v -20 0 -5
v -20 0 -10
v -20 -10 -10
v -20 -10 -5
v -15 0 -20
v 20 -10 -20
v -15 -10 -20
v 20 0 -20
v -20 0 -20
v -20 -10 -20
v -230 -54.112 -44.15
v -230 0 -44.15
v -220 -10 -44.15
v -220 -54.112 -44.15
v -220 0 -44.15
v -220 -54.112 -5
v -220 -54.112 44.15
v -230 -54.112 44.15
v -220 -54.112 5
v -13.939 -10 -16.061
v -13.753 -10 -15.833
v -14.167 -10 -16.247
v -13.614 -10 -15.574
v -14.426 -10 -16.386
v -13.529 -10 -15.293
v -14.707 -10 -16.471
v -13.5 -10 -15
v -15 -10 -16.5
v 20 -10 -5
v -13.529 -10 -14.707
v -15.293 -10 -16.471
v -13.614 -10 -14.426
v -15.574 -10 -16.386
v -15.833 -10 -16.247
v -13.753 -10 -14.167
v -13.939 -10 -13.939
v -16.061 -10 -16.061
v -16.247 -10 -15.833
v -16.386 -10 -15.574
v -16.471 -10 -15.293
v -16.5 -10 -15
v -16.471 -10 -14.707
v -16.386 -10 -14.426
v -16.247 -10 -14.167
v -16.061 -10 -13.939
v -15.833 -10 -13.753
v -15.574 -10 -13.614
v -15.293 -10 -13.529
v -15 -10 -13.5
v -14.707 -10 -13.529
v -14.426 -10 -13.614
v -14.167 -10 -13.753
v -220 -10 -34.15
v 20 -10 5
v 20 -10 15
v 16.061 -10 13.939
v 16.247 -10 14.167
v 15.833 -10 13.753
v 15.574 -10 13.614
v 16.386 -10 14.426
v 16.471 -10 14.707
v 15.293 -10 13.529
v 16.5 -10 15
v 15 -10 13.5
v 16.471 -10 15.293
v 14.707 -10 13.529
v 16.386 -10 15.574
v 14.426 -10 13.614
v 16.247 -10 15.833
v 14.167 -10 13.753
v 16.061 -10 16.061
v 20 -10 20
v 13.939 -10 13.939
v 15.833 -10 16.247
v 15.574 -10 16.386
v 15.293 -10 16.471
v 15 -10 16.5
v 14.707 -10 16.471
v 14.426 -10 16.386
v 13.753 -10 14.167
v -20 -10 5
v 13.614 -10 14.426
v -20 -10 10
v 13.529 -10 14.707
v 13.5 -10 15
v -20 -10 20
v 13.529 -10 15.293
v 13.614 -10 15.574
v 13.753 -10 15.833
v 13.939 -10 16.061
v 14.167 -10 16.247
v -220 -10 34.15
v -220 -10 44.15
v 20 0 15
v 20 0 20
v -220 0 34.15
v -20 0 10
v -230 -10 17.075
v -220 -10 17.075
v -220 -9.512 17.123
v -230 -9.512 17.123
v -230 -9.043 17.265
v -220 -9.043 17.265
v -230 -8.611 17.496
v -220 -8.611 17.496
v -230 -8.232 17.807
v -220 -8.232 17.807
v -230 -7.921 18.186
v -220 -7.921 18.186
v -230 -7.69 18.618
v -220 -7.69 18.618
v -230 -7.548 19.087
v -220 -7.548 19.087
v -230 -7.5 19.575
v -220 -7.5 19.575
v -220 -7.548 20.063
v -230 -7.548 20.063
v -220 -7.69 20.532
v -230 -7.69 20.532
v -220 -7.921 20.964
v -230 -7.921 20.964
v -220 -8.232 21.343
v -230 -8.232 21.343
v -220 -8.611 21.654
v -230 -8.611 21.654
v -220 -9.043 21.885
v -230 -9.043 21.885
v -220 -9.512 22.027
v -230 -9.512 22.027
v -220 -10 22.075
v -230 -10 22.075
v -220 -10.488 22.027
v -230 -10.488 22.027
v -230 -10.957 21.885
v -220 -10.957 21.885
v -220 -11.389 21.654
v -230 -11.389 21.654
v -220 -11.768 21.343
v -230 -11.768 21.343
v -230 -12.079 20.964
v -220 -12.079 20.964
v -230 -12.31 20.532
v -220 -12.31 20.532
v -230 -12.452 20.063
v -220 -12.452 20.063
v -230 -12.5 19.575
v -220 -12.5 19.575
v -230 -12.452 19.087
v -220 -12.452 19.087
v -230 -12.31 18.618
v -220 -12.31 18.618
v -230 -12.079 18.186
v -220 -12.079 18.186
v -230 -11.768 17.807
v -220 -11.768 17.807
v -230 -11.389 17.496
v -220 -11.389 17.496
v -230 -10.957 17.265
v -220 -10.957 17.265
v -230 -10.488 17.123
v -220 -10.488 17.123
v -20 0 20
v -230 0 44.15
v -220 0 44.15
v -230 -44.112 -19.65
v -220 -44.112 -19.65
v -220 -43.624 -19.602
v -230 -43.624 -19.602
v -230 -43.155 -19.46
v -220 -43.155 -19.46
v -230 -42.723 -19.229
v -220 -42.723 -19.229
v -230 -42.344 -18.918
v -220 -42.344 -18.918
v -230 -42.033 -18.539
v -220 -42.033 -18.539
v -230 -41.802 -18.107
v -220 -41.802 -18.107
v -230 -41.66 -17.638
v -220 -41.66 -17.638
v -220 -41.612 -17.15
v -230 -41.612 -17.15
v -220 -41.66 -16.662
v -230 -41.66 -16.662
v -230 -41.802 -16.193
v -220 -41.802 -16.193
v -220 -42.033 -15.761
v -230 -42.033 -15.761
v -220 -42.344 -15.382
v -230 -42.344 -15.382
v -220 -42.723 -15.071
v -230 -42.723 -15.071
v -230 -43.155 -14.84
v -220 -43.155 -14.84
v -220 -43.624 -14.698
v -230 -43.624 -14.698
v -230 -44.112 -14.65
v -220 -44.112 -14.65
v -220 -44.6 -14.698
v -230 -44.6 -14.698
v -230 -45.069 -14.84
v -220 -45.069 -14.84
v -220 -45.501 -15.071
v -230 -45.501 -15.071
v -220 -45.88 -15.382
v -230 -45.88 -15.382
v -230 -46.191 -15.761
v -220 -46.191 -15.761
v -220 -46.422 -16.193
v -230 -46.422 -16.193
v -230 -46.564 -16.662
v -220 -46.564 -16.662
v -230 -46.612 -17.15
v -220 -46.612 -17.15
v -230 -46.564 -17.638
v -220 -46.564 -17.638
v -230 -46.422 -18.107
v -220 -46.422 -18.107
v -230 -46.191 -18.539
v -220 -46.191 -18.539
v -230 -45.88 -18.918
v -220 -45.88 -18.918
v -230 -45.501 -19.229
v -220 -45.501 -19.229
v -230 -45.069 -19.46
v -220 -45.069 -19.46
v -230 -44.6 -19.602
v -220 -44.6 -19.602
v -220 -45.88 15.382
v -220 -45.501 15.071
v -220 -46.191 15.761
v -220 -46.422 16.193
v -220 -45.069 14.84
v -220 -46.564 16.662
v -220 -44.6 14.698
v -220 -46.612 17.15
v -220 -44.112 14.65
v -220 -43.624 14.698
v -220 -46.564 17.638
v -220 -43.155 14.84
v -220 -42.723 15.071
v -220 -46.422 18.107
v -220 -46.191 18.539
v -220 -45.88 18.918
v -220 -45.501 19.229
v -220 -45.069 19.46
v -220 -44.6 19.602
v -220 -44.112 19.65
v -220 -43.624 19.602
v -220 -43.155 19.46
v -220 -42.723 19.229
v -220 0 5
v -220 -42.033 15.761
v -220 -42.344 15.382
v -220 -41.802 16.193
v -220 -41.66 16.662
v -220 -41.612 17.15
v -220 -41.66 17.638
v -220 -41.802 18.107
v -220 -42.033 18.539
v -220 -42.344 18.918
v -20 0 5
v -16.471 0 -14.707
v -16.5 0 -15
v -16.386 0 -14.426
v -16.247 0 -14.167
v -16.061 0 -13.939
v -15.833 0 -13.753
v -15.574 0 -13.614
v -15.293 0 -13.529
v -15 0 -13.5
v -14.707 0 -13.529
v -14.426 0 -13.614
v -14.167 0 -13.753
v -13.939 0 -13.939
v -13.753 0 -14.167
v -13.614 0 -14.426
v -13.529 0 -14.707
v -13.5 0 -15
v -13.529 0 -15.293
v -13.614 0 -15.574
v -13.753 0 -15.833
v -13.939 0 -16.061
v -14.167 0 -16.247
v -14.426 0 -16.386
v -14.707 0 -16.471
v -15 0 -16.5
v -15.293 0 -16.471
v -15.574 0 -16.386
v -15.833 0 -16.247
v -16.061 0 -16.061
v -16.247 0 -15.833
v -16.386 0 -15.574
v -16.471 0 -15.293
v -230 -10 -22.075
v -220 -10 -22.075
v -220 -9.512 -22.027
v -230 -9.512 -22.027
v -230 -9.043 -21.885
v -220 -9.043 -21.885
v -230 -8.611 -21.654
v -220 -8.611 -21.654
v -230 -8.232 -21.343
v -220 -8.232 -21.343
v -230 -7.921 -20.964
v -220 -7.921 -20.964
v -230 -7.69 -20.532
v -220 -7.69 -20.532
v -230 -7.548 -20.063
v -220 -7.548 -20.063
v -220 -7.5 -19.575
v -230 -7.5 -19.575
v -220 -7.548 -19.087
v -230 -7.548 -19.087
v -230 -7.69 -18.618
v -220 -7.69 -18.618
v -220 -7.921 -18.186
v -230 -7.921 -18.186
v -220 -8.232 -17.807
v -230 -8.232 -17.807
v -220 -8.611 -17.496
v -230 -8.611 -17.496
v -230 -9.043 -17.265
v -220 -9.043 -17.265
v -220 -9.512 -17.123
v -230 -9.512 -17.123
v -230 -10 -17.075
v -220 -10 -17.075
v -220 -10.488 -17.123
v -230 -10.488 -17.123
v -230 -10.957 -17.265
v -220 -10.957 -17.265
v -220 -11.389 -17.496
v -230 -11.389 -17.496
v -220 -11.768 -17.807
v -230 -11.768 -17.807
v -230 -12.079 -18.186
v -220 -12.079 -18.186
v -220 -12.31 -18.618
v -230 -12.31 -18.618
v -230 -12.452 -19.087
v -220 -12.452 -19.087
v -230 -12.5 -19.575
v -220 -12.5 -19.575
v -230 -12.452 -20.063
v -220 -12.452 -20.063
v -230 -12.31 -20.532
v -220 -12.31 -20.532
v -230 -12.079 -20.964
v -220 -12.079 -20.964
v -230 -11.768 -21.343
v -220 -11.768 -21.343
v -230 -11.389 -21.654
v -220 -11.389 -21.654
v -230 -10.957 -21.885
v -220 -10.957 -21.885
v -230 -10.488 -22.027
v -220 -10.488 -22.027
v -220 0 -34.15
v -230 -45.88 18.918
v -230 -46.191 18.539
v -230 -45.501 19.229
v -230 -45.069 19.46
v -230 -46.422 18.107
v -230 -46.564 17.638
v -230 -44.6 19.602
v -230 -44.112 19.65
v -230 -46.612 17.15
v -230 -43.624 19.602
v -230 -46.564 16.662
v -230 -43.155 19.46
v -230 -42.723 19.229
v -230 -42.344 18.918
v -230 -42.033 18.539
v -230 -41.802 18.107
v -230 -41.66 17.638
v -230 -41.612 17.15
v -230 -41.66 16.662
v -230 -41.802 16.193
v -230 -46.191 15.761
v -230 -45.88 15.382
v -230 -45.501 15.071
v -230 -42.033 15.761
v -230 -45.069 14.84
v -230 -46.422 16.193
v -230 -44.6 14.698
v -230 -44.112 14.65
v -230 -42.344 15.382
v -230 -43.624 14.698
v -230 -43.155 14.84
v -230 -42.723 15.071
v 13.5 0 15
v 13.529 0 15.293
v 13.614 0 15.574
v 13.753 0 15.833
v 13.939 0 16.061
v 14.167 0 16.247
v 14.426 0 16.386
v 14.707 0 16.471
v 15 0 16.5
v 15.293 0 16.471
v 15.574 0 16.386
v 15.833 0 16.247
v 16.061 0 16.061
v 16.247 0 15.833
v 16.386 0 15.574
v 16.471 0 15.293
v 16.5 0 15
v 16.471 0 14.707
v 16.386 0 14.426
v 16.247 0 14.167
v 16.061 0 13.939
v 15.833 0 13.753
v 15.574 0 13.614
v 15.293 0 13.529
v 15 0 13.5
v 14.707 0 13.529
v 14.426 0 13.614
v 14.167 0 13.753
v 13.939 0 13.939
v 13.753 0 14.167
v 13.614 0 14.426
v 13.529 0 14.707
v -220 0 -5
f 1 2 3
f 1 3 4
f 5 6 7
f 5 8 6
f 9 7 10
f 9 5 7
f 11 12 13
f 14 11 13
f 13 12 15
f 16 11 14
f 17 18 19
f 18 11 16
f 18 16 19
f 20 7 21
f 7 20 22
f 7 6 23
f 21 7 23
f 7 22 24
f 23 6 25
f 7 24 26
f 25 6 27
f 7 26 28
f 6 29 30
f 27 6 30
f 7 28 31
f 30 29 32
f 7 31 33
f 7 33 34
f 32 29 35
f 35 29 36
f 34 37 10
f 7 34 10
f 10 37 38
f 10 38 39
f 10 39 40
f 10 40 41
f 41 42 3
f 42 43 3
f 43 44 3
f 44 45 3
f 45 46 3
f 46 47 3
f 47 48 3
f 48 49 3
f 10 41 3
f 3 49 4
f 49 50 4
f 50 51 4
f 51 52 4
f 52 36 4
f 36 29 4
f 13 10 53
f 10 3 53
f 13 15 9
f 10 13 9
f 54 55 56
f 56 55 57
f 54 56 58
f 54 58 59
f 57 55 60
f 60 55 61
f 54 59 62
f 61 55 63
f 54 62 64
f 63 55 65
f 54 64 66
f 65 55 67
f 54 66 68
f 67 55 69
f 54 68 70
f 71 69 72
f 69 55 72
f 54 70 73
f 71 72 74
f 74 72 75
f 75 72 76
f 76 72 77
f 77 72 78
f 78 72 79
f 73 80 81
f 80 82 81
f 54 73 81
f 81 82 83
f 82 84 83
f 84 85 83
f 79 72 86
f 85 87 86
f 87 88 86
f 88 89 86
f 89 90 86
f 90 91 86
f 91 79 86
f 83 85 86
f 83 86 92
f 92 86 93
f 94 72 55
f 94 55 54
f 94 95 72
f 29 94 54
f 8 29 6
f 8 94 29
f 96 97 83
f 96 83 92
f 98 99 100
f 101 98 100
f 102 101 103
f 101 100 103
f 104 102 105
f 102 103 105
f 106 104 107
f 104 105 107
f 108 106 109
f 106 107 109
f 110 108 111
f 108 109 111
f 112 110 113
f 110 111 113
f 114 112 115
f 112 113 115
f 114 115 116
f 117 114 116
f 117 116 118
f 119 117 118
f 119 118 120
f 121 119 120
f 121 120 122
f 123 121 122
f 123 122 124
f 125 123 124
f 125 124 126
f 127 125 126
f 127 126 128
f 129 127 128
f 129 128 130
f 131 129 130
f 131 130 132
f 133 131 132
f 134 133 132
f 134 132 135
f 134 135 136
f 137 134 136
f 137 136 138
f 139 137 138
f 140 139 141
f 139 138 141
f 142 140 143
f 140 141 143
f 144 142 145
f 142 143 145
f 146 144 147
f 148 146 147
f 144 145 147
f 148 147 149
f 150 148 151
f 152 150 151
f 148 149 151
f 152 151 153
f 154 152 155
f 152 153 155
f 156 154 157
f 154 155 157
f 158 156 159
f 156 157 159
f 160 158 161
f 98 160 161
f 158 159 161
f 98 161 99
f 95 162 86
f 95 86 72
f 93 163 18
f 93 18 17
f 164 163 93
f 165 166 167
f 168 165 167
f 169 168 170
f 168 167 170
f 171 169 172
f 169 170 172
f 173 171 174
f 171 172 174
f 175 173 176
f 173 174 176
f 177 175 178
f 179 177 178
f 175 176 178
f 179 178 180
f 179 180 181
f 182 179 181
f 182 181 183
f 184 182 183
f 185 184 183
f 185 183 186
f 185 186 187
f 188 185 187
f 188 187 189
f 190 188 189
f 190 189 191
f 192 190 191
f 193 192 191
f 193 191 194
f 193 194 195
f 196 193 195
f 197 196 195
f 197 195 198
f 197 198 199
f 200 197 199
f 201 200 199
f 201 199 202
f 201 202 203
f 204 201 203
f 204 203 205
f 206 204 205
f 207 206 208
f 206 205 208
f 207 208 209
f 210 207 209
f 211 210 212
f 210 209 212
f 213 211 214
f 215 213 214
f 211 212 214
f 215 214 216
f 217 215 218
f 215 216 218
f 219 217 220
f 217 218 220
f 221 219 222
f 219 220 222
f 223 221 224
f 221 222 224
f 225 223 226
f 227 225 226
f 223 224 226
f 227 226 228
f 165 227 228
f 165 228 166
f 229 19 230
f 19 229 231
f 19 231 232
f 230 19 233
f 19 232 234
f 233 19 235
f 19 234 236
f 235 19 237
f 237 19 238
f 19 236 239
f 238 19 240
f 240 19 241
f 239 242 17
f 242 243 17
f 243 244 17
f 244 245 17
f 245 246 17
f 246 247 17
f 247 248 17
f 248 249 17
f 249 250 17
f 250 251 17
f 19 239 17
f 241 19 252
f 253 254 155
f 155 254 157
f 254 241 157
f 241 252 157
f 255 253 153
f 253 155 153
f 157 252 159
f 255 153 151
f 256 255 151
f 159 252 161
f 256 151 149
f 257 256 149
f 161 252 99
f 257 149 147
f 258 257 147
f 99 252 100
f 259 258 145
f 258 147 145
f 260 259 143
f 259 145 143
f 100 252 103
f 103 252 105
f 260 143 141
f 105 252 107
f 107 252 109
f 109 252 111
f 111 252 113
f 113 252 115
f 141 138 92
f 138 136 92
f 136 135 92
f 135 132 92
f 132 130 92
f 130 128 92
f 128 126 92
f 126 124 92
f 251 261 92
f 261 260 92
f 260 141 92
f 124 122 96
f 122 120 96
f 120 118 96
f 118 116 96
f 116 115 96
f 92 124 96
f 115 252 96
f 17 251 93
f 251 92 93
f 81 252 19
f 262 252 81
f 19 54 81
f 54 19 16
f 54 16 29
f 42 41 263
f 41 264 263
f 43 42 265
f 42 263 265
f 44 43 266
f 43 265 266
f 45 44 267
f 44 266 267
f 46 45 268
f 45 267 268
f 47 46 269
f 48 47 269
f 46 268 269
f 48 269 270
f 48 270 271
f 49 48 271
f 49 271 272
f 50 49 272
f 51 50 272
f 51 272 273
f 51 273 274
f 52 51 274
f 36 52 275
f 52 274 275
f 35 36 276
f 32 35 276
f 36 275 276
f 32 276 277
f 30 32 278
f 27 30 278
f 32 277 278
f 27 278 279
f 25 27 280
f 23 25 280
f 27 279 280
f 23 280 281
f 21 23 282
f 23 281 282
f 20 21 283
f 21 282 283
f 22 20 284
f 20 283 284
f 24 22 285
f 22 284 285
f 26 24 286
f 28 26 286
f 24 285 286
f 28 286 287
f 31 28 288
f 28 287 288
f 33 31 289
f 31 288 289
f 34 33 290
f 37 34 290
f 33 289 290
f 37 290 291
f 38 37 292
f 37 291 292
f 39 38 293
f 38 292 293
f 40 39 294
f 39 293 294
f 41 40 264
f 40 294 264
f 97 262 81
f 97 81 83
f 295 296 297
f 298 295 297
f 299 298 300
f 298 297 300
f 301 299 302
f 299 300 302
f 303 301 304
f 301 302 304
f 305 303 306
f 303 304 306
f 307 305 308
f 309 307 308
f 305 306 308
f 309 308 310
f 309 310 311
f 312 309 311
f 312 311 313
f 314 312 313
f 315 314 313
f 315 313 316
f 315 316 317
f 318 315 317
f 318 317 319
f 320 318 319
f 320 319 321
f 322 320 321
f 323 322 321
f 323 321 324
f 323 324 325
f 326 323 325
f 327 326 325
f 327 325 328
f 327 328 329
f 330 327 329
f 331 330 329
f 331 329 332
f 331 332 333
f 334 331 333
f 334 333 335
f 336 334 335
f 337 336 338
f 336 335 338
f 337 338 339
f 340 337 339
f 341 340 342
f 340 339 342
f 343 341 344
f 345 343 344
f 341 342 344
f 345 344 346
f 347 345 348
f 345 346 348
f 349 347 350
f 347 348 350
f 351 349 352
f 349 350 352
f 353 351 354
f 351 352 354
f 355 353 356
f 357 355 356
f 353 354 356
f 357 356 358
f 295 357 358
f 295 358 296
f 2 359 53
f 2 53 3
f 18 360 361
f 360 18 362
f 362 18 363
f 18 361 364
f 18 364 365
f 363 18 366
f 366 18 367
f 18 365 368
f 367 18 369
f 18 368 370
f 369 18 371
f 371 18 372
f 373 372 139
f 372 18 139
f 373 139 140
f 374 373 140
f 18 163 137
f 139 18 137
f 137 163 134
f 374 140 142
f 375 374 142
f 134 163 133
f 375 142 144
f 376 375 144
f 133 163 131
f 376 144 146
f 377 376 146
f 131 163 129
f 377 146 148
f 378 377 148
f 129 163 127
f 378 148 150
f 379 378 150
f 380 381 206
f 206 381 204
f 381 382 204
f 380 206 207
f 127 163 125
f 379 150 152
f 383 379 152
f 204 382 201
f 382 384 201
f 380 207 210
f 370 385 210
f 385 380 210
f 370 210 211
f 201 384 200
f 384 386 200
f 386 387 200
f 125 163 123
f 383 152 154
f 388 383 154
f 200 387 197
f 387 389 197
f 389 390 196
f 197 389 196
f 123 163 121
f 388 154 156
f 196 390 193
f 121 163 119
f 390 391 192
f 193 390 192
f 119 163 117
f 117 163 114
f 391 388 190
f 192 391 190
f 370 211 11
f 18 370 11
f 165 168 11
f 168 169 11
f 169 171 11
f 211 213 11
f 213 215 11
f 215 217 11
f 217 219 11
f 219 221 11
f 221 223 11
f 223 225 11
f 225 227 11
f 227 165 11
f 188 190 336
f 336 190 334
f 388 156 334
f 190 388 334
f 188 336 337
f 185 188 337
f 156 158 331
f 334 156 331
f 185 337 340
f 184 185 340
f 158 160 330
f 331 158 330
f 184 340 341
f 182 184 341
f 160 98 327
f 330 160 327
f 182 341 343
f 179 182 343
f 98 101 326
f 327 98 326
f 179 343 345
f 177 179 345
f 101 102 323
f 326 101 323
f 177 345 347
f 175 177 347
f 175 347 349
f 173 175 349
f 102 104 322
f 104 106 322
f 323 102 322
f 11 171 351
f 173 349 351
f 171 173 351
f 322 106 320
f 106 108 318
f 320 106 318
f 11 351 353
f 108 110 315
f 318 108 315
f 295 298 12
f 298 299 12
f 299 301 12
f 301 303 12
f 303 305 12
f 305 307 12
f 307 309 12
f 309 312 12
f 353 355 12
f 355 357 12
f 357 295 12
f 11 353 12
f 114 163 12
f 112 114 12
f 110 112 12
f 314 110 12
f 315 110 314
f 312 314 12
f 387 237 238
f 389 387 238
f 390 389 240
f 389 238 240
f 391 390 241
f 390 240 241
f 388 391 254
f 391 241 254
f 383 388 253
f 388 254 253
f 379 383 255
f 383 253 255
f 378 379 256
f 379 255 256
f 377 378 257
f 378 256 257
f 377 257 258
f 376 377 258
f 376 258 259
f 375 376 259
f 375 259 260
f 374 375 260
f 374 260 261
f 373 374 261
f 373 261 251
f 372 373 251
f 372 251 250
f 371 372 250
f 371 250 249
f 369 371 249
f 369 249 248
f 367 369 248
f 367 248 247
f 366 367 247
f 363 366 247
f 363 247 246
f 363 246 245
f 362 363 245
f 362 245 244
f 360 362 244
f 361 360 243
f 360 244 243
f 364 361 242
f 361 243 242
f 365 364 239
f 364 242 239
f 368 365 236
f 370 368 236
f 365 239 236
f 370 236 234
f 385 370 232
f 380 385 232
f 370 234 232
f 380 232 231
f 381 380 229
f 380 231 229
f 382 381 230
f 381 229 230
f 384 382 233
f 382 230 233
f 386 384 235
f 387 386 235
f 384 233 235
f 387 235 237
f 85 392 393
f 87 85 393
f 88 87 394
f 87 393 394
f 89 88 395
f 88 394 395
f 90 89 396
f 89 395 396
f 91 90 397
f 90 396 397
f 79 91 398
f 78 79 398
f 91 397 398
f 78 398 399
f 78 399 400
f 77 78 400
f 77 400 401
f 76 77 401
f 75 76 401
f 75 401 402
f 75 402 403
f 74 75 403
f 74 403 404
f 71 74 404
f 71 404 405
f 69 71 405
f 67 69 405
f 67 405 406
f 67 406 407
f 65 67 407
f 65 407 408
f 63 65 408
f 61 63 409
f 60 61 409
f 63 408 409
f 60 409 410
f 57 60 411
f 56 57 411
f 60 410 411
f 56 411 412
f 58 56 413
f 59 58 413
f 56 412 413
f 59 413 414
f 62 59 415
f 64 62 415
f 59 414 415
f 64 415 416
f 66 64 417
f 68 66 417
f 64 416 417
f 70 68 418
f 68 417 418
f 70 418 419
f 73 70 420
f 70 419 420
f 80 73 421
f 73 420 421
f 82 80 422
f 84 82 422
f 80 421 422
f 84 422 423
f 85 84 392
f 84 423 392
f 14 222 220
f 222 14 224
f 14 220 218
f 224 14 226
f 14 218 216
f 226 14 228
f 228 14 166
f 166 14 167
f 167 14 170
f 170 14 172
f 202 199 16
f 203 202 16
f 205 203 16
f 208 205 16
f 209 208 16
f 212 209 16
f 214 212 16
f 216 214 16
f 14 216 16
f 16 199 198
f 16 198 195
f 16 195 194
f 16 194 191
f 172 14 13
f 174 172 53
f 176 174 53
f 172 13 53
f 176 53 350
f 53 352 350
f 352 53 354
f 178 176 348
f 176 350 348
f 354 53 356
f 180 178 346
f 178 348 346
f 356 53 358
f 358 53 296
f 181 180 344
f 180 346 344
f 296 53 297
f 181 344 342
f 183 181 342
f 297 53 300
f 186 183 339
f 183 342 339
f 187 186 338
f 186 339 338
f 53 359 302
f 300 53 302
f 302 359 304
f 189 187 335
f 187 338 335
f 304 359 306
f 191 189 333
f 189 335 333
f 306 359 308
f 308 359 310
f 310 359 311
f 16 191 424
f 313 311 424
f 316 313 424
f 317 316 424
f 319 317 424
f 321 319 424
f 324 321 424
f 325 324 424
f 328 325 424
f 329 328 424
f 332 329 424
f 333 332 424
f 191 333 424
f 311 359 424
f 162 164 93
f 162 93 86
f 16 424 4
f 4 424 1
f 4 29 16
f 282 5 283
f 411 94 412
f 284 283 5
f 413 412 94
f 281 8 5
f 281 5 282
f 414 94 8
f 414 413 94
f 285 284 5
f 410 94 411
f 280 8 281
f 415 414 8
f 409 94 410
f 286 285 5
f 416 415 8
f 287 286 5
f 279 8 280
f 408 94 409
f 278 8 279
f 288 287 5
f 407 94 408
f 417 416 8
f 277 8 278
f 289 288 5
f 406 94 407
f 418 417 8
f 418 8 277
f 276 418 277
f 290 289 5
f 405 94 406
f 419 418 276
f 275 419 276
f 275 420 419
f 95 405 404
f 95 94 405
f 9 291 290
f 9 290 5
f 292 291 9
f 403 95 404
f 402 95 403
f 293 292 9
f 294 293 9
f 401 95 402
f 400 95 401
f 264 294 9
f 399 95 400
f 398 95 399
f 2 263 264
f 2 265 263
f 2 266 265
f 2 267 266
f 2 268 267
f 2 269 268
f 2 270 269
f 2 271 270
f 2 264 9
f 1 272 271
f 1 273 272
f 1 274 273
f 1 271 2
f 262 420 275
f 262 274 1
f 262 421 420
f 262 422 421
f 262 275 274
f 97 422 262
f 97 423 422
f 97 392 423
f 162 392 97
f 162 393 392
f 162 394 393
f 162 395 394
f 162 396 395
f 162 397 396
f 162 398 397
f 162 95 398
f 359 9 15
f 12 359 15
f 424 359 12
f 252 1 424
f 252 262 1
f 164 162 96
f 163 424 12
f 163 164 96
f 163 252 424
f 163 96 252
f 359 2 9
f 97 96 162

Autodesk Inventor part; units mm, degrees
ref_plane "YZ Plane" through (0, 0, 0) normal (1, 0, 0) x (0, 1, 0)
ref_plane "XZ Plane" through (0, 0, 0) normal (0, 1, 0) x (-1, 0, 0)
sketch "Sketch1" plane through (0, 0, 0) normal (0, 1, 0) x (-1, 0, 0)
  line L0 (20, 20) -> (-20, 20)
  line L1 (-20, 20) -> (-20, -20)
  line L2 (-20, -20) -> (20, -20)
  line L3 (20, -20) -> (20, 20)
  line L4 (20, 20) -> (-20, -20) construction
  line L5 (-20, 20) -> (20, -20) construction
  line L6 (-20, 0) -> (230, 0)
  line L7 (230, 0) -> (230, 44.15)
  line L8 (230, 44.15) -> (220, 44.15)
  line L9 (220, 44.15) -> (230, 44.15)
  line L10 (230, 44.15) -> (230, -44.15)
  line L11 (230, -44.15) -> (220, -44.15)
  line L12 (220, -44.15) -> (220, 44.15)
  line L13 (220, 44.15) -> (20, 20)
  line L14 (220, -44.15) -> (20, -20)
  line L15 (20, -20) -> (20, -10)
  line L16 (20, 20) -> (20, 10)
  line L17 (220, 44.15) -> (220, 34.15)
  line L18 (220, -44.15) -> (220, -34.15)
  line L19 (20, 10) -> (220, 34.15)
  line L20 (220, -34.15) -> (20, -10)
  line L21 (220, 0) -> (220, -5)
  line L22 (20, 0) -> (20, 5)
  line L23 (220, -5) -> (20, -5)
  line L24 (20, -5) -> (20, 5)
  line L25 (20, 5) -> (220, 5)
  line L26 (220, 5) -> (220, -5)
  line L27 (-20, 20) -> (-20, 15)
  line L28 (-20, 15) -> (-15, 15)
  line L29 (20, -20) -> (15, -20)
  line L30 (15, -20) -> (15, -15)
  circle A0 centre (15, -15) radius 1.5
  circle A1 centre (-15, 15) radius 1.5
  point P0 (0, 0)
  dimension "d0" = 40
  dimension "d1" = 40
  dimension "d2" = 250
  dimension "d3" = 44.15
  dimension "d4" = 10
  dimension "d5" = 88.3
  dimension "d6" = 10
  dimension "d7" = 10
  dimension "d8" = 10
  dimension "d9" = 10
  dimension "d10" = 5
  dimension "d11" = 5
  dimension "d12" = 5
  dimension "d13" = 5
  dimension "d14" = 3
  dimension "d15" = 3
extrude "Extrusion1" add sketch "Sketch1" against normal blind 10 contours L3 L6 L1 L0 | L13 L12 L19 L3 | L8 L7 L6 L12 | L25 L12 L6 L3 | L6 L3 L2 L1 | L6 L12 L23 L3 | L10 L11 L12 L6 | L20 L12 L14 L3
sketch "Sketch2" plane through (0, -10, 0) normal (0, -1, 0) x (1, 0, 0)
  line L0 (-230, 44.15) -> (-230, -44.15) projected
  line L1 (-230, 44.15) -> (-220, 44.15) projected
  line L2 (-230, -44.15) -> (-220, -44.15)
  line L3 (-220, -44.15) -> (-220, 44.15)
  line L4 (-220, 44.15) -> (-230, 44.15)
  line L5 (-230, 44.15) -> (-230, -44.15)
  point P0 (0, 0)
extrude "Extrusion2" add sketch "Sketch2" along normal blind 44.112
ref_plane "Work Plane1" through (-220, 0, 5) normal (0, 0, 1) x (1, 0, 0)
sketch "Sketch3" plane through (-220, 0, 5) normal (0, 0, 1) x (1, 0, 0)
  line L0 (0, -10) -> (0, -54.112) projected
  line L1 (200, -10) -> (240, -10) projected
  line L2 (0, -54.112) -> (240, -10)
  line L3 (0, 0) -> (0, -10) projected
  line L4 (0, -54.112) -> (0, -10)
  line L5 (0, -10) -> (240, -10)
  point P0 (220, 0)
extrude "Extrusion3" add sketch "Sketch3" against normal blind 10
sketch "Sketch5" plane through (-220, 0, 34.15) normal (1, 0, 0) x (0, 0, -1)
  line L0 (0, 0) -> (29.15, 0) projected
  line L1 (0, 0) -> (14.575, 0)
  line L2 (14.575, 0) -> (14.575, -10)
  circle A0 centre (14.575, -10) radius 2.5
  line L3 (34.15, 0) -> (34.15, -54.112)
  line L4 (39.15, -54.112) -> (29.15, -54.112) projected
  circle A1 centre (53.725, -10) radius 2.5
  dimension "d23" = 14.575
  dimension "d24" = 10
  dimension "d25" = 5
extrude "Extrusion4" cut sketch "Sketch5" against normal blind 10
sketch "Sketch6" plane through (-220, 0, 34.15) normal (1, 0, 0) x (0, 0, -1)
  line L0 (-10, 0) -> (-10, -54.112) projected
  line L1 (-10, -54.112) -> (17, -54.112)
  line L2 (17, -54.112) -> (17, -44.112)
  circle A0 centre (17, -44.112) radius 2.5
  line L3 (34.15, 0) -> (34.15, -54.112)
  line L4 (39.15, -54.112) -> (29.15, -54.112) projected
  circle A1 centre (51.3, -44.112) radius 2.5
  dimension "d28" = 27
  dimension "d29" = 10
  dimension "d30" = 5
extrude "Extrusion5" cut sketch "Sketch6" against normal blind 10
properties part number "magnetometer_holder" material "PET Plastic"
